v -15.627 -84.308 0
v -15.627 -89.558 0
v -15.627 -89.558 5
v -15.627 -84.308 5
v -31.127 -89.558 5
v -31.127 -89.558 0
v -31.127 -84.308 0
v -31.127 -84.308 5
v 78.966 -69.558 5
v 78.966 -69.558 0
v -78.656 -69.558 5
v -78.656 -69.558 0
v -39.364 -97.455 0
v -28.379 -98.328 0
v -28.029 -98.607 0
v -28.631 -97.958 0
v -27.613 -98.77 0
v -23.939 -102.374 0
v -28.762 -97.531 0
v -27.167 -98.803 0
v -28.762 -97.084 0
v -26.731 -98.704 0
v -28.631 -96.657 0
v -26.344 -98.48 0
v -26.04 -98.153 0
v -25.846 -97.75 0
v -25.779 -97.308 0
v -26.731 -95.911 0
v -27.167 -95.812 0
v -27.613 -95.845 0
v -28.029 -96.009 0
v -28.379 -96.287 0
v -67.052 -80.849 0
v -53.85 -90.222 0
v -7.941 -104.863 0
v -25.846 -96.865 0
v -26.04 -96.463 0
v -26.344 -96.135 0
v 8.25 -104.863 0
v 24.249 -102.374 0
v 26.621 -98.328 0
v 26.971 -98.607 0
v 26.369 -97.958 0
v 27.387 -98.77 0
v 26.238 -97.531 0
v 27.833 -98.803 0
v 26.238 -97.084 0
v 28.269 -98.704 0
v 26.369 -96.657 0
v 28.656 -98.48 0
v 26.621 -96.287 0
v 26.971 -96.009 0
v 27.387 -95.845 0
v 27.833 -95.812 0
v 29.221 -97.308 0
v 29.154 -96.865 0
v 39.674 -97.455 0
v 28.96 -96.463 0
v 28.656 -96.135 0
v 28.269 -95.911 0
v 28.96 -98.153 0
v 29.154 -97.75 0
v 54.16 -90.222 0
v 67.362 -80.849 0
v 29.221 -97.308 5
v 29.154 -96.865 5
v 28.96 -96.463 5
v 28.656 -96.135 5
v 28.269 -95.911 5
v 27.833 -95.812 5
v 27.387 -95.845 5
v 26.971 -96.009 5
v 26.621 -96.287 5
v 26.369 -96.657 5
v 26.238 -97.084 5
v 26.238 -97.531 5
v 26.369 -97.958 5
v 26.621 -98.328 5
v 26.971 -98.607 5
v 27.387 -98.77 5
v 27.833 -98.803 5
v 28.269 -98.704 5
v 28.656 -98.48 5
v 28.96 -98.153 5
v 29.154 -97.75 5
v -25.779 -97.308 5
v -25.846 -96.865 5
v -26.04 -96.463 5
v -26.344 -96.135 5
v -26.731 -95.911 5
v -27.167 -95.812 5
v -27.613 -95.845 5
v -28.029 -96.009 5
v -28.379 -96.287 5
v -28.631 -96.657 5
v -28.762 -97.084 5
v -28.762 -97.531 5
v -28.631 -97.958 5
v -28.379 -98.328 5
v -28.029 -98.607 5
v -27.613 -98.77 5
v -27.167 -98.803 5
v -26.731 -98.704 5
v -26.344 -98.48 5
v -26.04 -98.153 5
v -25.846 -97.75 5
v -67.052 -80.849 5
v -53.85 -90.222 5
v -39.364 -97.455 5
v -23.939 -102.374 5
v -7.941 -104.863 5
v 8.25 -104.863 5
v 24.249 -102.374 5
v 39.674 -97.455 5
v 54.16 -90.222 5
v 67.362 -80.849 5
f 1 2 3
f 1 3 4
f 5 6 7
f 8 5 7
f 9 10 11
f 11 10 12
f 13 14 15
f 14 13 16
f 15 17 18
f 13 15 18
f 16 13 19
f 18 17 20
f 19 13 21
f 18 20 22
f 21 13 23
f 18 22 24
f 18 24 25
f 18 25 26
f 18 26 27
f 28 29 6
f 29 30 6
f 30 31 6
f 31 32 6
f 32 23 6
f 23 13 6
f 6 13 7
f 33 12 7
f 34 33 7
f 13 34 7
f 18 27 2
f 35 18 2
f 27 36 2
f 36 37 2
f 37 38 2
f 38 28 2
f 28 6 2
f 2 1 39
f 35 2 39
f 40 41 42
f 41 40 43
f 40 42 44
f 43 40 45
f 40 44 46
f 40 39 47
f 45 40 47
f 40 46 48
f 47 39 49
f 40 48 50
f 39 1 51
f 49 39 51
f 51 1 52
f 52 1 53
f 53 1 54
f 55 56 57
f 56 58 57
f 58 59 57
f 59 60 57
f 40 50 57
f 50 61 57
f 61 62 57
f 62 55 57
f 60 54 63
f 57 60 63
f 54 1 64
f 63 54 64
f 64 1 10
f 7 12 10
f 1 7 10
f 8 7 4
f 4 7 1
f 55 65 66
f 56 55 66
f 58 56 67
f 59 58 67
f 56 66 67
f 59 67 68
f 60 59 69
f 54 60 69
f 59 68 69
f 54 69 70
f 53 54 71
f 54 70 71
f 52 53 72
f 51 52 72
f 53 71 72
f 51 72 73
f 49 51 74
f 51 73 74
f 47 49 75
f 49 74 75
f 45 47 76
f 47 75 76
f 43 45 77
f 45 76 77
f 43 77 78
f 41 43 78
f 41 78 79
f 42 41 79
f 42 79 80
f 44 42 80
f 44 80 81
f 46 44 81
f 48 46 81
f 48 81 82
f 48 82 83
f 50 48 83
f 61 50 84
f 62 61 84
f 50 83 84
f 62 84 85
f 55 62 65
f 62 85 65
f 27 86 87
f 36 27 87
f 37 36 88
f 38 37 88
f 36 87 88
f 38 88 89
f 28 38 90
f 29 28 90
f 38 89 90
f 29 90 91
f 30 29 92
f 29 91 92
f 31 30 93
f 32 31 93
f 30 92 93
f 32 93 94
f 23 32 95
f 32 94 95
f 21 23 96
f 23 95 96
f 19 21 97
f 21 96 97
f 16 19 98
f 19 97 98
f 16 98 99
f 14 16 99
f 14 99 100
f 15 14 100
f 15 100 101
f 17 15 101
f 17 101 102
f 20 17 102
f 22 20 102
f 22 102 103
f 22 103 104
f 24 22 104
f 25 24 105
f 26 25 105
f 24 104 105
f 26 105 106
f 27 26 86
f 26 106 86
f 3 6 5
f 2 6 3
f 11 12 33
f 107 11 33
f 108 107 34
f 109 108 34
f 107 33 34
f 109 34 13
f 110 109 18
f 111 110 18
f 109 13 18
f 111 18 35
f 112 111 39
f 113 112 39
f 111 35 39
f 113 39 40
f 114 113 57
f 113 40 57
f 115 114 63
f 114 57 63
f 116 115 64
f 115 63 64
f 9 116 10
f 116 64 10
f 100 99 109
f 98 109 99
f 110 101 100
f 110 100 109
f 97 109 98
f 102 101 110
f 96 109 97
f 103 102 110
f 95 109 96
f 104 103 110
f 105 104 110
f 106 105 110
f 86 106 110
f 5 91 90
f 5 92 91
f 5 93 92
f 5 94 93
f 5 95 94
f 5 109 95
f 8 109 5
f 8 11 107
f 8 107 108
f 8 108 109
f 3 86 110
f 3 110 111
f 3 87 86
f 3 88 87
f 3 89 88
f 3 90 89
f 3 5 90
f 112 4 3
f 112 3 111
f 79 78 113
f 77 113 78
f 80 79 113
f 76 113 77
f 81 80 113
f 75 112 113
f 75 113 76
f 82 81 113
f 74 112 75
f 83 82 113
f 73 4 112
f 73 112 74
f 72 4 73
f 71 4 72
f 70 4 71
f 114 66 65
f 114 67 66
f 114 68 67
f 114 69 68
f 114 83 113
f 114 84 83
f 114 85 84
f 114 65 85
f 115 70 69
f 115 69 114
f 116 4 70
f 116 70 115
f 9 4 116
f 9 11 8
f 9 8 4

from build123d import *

# Parameters (mm, degrees)
ESQUISSE1_W             = 15.5
ESQUISSE1_H             = 5.25
BOSS_EXTRU_1_DEPTH      = 5
ESQUISSE2_R             = 1.5
ENL_V_MAT_EXTRU_1_DEPTH = 5


with BuildPart() as part:
    # Esquisse1 → Boss.-Extru.1 (new body)
    with BuildSketch(Plane.XY):
        with BuildLine():
            Line((78.965631611, -69.557615642), (-78.655820549, -69.557615642))
            ThreePointArc((-78.655820549, -69.557615642), (0.154905531, -105.175561372), (78.965631611, -69.557615642))
        make_face()
        with Locations((-23.37664966, -86.932615642)):
            Rectangle(ESQUISSE1_W, ESQUISSE1_H, mode=Mode.SUBTRACT)
    extrude(amount=BOSS_EXTRU_1_DEPTH)

    # Esquisse2 → Enlèv. mat.-Extru.1 (cut)
    with BuildSketch(Plane.XY.offset(5)):
        with Locations((-27.279170889, -97.307615642)):
            Circle(ESQUISSE2_R)
        with Locations((27.720829111, -97.307615642)):
            Circle(ESQUISSE2_R)
    extrude(amount=-ENL_V_MAT_EXTRU_1_DEPTH, mode=Mode.SUBTRACT)


solid = part.part
